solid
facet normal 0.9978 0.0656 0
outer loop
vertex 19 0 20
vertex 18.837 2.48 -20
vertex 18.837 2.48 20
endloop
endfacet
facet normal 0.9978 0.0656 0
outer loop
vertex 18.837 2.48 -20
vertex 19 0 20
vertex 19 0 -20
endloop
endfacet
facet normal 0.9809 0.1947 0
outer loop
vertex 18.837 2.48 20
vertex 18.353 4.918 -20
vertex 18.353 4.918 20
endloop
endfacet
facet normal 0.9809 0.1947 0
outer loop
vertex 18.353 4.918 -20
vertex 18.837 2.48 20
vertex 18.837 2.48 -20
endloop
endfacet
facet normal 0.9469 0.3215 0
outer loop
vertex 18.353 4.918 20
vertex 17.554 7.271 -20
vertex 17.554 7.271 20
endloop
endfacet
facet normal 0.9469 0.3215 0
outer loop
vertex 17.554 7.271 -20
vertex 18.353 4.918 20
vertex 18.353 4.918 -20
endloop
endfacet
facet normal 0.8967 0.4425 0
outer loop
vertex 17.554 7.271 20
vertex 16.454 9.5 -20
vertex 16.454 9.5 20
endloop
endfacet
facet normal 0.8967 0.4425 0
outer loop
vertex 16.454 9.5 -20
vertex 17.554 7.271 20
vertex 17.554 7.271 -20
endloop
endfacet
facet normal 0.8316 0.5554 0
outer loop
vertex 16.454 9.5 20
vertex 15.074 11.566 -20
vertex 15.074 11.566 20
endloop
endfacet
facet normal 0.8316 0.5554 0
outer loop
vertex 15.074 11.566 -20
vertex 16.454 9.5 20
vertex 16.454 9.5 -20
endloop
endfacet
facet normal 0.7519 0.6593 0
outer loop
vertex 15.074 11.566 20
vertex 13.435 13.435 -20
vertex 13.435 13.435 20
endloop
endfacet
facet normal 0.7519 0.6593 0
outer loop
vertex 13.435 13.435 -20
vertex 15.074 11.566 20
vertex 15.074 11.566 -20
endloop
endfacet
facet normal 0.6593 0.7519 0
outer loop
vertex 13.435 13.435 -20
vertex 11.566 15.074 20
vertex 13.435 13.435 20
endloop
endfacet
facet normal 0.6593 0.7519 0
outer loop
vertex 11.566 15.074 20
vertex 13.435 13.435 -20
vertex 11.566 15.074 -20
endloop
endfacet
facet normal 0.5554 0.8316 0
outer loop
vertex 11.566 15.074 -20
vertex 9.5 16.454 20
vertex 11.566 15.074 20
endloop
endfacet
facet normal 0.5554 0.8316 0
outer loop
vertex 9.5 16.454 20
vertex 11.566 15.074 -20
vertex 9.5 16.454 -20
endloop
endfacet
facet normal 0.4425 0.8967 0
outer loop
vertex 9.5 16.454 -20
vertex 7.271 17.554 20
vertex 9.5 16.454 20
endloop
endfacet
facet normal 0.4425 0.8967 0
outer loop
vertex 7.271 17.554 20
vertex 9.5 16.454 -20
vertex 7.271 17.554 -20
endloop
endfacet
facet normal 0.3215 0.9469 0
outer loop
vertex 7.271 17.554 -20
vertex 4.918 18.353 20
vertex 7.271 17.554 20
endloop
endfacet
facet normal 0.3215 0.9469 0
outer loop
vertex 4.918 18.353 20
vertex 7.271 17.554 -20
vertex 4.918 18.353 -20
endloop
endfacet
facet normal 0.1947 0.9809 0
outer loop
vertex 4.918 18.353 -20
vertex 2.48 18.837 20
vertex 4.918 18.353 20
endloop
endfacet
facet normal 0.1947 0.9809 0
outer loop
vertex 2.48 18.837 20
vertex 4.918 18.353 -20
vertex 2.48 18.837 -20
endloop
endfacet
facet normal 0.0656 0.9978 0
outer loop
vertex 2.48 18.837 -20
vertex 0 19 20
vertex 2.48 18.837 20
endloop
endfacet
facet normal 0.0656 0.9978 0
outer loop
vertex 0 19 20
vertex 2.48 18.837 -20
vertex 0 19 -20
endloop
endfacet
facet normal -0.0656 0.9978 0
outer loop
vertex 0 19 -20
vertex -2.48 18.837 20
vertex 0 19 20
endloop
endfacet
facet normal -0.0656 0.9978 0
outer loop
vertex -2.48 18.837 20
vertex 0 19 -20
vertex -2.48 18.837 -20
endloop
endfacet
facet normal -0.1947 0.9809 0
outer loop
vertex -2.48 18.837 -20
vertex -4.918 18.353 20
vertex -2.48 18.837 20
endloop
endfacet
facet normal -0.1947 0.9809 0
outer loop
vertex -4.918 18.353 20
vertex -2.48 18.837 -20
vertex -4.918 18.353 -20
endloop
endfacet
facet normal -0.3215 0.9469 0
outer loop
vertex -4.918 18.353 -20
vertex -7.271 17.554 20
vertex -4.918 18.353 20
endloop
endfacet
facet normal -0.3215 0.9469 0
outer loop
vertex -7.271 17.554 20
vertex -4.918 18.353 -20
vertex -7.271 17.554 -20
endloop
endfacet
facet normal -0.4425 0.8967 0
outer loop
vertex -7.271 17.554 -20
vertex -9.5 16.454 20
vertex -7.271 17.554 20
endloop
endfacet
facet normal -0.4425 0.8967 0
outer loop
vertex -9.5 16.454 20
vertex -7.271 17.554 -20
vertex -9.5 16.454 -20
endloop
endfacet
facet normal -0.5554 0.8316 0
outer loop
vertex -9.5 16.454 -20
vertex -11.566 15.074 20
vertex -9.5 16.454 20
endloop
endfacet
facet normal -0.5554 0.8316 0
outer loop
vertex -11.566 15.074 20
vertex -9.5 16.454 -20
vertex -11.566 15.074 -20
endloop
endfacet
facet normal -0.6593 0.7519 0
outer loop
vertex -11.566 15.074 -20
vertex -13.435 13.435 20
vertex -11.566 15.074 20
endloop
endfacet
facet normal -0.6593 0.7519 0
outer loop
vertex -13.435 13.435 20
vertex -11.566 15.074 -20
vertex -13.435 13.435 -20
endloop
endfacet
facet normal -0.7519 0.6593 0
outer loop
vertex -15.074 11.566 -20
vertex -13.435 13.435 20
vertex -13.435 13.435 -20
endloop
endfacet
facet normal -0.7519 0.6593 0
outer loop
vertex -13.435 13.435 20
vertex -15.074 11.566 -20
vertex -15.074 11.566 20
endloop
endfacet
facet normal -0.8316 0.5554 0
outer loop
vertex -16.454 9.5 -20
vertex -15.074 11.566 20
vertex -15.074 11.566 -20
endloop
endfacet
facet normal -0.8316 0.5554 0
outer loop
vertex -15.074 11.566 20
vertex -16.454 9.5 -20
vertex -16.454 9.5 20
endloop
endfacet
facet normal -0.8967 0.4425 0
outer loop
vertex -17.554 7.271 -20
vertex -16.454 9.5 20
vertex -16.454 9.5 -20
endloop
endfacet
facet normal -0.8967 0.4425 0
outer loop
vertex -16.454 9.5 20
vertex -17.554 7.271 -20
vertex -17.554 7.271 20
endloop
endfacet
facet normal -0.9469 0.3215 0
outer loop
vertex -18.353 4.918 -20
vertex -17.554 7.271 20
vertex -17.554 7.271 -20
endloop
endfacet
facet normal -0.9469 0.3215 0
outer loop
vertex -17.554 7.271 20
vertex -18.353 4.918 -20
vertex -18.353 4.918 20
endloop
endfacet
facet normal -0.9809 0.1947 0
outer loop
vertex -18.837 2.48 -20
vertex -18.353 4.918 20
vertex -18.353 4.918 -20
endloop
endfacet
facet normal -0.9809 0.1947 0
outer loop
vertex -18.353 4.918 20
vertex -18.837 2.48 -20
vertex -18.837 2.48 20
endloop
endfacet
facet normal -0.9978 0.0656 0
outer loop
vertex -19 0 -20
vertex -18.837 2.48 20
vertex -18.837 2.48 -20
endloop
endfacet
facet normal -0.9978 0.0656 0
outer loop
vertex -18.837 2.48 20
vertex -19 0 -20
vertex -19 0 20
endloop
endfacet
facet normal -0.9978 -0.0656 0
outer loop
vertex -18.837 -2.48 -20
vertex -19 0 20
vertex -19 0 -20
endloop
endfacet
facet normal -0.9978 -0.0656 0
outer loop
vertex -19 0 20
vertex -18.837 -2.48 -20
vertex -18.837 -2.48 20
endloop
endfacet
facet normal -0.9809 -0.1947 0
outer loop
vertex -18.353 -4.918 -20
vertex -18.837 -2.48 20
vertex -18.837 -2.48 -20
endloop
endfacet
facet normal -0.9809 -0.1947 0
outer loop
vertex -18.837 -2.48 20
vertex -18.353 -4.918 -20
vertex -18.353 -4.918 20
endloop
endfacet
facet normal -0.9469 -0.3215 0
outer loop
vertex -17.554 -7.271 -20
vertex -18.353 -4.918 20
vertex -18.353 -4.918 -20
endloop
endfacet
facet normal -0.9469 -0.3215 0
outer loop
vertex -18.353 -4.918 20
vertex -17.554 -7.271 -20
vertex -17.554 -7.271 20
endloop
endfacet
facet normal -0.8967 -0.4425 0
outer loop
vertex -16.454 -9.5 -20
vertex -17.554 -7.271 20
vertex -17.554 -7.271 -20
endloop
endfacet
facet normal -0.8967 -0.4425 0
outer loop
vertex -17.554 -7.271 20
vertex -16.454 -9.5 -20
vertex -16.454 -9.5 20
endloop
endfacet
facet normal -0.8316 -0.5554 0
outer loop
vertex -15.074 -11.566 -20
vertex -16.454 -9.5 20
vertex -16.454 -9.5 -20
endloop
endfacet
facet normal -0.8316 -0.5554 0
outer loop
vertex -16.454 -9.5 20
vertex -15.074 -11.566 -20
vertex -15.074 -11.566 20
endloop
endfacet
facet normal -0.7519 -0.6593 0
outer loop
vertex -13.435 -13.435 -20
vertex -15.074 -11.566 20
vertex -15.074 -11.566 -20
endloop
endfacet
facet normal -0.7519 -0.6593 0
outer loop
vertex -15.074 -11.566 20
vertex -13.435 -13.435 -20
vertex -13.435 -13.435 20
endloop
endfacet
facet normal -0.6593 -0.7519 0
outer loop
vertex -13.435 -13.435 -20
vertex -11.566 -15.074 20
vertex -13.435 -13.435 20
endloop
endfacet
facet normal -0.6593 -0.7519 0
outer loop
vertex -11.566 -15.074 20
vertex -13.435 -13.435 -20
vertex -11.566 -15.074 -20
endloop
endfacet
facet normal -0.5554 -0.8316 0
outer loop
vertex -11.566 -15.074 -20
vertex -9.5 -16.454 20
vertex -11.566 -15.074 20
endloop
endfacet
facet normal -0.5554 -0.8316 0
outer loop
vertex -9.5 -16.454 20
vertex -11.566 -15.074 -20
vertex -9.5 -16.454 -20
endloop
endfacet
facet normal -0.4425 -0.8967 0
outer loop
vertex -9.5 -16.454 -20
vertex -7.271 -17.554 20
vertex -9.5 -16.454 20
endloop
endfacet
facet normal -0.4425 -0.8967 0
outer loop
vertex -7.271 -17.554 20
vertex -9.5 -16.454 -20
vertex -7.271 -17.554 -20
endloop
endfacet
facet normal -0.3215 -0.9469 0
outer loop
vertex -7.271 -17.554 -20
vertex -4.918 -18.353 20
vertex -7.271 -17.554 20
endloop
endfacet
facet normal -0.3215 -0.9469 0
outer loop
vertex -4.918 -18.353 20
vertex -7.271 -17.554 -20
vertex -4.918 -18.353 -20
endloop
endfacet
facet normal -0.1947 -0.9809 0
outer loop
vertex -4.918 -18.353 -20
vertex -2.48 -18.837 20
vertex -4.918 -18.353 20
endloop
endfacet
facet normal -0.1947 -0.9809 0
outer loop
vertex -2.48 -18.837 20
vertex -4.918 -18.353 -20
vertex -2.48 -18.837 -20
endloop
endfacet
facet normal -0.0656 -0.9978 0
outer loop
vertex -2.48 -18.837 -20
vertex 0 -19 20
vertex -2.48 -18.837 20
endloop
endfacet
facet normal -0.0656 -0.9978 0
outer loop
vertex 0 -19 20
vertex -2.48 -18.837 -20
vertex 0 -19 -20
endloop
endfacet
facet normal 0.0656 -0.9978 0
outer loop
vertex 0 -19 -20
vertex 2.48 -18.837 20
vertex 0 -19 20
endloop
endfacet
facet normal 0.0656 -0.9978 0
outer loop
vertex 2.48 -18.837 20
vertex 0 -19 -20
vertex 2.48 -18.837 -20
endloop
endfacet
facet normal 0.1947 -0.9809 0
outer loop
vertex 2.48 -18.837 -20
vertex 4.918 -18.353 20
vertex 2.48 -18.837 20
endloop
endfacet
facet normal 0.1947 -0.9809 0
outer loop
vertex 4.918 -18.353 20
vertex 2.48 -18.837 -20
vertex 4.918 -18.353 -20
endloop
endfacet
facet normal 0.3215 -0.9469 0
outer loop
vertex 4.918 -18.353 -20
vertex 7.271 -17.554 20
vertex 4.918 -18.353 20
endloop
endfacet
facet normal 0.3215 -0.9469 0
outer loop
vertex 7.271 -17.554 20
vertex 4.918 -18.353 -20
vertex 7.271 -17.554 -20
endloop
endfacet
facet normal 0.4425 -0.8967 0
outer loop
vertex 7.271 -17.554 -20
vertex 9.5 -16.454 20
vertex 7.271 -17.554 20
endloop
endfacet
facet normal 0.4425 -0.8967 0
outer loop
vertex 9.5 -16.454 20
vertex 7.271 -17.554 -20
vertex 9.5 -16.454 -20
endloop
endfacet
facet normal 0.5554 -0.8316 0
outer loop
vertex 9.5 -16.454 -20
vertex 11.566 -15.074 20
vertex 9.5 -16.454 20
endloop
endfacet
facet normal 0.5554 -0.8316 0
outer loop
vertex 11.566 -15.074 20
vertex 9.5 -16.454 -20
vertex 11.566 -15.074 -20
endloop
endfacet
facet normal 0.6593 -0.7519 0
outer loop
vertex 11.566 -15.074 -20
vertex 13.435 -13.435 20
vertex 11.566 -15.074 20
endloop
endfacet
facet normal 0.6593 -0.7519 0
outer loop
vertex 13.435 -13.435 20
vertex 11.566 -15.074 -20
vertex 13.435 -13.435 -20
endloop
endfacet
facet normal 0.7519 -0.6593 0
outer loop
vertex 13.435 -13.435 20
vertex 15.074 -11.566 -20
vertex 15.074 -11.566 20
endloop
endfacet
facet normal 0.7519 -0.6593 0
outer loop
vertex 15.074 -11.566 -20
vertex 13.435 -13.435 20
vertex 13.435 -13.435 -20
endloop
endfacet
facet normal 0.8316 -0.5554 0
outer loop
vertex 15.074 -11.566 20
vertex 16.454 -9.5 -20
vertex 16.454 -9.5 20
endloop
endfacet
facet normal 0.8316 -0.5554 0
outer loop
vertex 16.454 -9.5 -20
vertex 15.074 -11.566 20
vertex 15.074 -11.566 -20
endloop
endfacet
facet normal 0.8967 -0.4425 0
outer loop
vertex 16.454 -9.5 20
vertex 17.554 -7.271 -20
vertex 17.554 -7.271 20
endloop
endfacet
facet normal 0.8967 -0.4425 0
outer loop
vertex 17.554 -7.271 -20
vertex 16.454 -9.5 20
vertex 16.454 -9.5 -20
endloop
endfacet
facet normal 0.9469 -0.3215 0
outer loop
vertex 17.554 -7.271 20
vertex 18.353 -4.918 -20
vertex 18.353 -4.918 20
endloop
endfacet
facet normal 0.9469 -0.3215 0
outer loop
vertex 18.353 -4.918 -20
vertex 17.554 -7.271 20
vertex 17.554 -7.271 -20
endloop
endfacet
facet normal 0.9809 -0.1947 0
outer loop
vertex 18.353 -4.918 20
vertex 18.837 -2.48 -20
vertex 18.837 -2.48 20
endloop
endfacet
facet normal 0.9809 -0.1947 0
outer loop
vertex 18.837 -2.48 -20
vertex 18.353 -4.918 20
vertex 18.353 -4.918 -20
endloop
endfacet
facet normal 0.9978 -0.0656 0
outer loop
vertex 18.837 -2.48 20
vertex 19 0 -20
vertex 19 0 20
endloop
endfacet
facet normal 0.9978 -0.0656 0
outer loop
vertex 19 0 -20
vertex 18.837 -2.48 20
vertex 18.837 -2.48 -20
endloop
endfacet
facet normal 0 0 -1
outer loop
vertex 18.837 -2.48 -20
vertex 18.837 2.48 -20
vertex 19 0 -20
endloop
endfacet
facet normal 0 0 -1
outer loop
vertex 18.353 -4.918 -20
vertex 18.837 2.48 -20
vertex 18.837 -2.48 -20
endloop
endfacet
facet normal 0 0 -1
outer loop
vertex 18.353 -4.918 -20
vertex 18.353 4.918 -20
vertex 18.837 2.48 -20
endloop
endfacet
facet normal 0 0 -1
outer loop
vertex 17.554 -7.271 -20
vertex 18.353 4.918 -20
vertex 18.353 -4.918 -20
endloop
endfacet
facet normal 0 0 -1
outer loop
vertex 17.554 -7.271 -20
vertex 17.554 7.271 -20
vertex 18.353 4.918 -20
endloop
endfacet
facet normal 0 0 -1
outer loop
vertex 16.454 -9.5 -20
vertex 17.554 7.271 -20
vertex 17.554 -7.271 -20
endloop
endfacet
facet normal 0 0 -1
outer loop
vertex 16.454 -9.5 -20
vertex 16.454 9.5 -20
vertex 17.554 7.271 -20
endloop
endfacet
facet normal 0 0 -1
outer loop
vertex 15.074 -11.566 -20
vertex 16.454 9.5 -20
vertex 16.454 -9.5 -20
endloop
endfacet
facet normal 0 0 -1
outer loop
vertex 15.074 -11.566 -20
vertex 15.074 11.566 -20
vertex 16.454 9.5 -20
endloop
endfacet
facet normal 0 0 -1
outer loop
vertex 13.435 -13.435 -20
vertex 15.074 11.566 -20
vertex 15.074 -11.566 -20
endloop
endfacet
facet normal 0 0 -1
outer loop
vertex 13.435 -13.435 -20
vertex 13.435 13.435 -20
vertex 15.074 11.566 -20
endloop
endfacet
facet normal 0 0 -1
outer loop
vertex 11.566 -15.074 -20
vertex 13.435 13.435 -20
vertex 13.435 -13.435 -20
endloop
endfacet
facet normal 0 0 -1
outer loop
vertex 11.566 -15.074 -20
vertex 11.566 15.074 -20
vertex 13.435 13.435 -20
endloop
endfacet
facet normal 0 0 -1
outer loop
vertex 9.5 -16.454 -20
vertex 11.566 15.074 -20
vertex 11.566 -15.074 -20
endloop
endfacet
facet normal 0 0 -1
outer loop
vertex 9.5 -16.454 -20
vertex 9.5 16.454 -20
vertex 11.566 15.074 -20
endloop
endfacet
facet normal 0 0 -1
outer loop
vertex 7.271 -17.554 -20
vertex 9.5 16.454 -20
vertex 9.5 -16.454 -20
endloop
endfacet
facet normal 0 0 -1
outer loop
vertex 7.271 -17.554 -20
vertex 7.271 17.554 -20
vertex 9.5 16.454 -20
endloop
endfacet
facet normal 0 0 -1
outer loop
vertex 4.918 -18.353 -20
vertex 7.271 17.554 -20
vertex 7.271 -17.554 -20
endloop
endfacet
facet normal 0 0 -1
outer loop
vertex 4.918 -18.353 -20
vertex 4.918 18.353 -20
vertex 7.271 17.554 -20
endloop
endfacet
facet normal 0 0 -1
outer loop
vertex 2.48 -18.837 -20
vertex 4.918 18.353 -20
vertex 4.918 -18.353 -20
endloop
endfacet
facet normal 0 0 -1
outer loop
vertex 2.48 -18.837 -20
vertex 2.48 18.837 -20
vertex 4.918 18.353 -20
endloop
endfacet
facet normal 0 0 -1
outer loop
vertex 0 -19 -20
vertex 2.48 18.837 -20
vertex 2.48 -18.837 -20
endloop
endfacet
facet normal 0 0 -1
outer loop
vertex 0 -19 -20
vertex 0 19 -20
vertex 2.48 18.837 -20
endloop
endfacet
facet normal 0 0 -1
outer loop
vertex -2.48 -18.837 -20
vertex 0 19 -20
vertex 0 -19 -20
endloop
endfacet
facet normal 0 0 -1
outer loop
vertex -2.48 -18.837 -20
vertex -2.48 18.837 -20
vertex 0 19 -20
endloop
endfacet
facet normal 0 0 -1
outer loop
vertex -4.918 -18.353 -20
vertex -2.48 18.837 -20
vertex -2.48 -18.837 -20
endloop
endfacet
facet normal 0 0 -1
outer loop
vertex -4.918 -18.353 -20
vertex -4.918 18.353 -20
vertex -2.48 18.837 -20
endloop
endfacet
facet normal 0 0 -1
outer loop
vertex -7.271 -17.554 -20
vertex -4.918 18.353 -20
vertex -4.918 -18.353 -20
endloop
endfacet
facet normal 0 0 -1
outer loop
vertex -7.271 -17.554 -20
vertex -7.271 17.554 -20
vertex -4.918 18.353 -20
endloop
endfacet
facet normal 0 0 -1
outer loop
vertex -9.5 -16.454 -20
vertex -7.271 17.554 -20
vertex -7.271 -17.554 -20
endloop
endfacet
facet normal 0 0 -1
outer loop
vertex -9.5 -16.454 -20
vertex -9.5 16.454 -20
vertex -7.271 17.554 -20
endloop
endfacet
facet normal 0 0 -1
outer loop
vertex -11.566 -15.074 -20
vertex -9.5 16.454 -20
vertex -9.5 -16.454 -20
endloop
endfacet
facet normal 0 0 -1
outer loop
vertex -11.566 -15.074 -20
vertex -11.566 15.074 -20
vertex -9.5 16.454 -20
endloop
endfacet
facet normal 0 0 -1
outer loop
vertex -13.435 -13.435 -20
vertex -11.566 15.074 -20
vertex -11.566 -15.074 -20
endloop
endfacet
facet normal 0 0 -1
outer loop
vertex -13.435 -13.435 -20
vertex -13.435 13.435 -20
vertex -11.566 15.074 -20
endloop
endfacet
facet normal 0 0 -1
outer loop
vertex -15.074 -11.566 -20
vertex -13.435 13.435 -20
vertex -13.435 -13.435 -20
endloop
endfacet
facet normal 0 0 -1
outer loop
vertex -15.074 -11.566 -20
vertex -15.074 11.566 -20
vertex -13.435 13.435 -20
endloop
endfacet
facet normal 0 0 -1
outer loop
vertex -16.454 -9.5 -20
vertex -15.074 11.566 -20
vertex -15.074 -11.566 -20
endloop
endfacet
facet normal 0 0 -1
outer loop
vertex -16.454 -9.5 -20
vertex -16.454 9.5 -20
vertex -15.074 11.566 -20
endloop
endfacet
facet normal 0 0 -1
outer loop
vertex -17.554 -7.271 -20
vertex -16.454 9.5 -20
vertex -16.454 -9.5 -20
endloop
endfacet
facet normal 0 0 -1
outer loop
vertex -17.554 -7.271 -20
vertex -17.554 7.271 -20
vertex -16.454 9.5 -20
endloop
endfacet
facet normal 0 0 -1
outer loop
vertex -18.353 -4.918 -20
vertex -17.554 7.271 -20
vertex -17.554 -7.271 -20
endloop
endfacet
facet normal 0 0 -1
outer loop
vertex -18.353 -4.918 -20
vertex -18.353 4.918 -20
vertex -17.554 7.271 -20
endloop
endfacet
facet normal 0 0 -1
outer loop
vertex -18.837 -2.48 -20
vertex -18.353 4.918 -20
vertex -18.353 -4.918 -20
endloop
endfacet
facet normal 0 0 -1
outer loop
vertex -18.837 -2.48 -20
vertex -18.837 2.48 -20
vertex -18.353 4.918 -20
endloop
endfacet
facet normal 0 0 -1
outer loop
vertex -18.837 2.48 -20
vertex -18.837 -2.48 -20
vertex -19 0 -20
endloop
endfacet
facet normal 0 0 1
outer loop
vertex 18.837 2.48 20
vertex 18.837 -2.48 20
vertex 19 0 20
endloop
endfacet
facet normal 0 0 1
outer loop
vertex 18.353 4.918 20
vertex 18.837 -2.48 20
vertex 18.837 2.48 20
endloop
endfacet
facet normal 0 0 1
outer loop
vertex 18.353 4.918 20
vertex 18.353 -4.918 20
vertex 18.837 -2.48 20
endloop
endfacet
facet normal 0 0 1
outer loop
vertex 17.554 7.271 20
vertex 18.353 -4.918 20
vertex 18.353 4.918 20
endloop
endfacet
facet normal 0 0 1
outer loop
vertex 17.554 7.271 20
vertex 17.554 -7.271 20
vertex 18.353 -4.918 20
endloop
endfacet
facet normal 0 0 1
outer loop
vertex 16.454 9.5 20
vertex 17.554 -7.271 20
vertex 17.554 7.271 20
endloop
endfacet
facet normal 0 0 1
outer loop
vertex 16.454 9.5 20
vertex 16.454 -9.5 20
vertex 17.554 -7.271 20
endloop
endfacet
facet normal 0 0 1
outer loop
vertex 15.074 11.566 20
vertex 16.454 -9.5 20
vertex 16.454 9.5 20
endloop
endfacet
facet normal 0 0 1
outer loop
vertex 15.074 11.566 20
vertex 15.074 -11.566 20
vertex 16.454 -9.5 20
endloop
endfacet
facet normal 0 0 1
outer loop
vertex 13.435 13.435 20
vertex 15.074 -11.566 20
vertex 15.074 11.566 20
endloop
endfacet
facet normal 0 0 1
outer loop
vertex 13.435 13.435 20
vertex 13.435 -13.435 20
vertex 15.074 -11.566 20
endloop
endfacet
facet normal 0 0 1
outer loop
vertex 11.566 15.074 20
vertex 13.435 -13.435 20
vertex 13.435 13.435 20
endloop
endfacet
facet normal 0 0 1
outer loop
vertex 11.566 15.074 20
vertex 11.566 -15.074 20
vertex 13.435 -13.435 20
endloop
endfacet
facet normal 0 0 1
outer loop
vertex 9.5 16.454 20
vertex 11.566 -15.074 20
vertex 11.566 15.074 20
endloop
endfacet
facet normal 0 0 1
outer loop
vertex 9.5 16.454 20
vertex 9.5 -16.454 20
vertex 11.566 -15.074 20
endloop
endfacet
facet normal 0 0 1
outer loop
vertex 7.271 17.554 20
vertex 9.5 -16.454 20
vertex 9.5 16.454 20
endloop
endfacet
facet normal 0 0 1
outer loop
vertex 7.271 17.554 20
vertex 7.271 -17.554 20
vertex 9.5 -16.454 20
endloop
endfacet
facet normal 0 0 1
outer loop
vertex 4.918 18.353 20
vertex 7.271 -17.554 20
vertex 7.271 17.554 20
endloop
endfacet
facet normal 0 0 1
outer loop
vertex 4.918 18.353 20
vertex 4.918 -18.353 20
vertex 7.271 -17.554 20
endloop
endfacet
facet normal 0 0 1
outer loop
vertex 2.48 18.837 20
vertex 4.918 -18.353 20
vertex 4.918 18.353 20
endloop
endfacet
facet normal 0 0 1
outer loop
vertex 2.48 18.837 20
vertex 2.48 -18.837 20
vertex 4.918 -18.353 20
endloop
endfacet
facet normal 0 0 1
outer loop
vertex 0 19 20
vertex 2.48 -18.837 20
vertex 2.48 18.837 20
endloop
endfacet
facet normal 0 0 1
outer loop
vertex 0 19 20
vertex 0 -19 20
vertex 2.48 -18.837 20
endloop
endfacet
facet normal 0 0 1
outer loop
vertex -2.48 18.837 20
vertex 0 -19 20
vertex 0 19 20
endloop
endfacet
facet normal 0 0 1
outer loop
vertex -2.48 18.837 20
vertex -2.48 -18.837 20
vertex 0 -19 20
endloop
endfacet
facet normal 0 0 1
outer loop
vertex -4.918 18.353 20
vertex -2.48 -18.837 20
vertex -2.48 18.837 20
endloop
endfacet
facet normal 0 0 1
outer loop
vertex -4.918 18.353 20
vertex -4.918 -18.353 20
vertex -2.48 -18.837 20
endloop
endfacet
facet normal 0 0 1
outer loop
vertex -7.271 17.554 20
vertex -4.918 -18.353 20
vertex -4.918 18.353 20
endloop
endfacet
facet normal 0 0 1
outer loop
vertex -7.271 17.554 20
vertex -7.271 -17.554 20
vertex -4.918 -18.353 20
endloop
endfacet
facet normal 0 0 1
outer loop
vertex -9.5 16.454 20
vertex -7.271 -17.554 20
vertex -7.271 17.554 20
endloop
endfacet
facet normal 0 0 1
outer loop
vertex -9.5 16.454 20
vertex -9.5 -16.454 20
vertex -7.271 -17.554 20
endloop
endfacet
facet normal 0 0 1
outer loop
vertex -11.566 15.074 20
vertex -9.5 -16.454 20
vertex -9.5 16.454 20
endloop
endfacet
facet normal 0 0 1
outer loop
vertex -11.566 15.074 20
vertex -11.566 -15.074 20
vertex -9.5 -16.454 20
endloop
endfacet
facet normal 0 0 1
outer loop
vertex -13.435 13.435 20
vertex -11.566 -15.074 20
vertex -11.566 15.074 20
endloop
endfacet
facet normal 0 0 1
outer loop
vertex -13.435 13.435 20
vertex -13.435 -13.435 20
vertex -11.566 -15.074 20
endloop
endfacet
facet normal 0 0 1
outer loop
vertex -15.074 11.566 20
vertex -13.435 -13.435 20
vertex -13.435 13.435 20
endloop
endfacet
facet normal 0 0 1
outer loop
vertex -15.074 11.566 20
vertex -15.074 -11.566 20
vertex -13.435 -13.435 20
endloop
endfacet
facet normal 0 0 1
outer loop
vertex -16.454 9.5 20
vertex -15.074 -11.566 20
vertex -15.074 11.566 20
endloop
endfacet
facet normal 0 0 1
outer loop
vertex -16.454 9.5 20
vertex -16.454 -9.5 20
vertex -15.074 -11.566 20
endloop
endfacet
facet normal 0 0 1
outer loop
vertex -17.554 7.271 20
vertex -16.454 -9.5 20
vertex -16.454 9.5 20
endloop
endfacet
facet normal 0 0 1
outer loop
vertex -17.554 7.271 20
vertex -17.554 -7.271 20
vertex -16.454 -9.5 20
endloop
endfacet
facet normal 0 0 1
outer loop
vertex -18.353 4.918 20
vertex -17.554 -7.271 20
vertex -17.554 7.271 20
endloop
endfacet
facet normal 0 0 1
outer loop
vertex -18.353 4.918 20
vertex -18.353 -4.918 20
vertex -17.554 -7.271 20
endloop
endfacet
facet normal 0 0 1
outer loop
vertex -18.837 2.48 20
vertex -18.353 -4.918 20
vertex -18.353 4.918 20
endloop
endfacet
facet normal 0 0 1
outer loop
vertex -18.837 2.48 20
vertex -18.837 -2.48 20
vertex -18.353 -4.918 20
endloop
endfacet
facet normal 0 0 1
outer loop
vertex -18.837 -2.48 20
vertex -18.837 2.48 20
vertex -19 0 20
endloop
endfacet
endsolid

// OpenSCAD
// ========================================
// a cylinder with radius 1.9 cm and height 4 cm
// NeuroCAD canonical IR; dimensions are millimetres
// ========================================
$fn = 48;

cylinder(r=19, h=40, center=true);
